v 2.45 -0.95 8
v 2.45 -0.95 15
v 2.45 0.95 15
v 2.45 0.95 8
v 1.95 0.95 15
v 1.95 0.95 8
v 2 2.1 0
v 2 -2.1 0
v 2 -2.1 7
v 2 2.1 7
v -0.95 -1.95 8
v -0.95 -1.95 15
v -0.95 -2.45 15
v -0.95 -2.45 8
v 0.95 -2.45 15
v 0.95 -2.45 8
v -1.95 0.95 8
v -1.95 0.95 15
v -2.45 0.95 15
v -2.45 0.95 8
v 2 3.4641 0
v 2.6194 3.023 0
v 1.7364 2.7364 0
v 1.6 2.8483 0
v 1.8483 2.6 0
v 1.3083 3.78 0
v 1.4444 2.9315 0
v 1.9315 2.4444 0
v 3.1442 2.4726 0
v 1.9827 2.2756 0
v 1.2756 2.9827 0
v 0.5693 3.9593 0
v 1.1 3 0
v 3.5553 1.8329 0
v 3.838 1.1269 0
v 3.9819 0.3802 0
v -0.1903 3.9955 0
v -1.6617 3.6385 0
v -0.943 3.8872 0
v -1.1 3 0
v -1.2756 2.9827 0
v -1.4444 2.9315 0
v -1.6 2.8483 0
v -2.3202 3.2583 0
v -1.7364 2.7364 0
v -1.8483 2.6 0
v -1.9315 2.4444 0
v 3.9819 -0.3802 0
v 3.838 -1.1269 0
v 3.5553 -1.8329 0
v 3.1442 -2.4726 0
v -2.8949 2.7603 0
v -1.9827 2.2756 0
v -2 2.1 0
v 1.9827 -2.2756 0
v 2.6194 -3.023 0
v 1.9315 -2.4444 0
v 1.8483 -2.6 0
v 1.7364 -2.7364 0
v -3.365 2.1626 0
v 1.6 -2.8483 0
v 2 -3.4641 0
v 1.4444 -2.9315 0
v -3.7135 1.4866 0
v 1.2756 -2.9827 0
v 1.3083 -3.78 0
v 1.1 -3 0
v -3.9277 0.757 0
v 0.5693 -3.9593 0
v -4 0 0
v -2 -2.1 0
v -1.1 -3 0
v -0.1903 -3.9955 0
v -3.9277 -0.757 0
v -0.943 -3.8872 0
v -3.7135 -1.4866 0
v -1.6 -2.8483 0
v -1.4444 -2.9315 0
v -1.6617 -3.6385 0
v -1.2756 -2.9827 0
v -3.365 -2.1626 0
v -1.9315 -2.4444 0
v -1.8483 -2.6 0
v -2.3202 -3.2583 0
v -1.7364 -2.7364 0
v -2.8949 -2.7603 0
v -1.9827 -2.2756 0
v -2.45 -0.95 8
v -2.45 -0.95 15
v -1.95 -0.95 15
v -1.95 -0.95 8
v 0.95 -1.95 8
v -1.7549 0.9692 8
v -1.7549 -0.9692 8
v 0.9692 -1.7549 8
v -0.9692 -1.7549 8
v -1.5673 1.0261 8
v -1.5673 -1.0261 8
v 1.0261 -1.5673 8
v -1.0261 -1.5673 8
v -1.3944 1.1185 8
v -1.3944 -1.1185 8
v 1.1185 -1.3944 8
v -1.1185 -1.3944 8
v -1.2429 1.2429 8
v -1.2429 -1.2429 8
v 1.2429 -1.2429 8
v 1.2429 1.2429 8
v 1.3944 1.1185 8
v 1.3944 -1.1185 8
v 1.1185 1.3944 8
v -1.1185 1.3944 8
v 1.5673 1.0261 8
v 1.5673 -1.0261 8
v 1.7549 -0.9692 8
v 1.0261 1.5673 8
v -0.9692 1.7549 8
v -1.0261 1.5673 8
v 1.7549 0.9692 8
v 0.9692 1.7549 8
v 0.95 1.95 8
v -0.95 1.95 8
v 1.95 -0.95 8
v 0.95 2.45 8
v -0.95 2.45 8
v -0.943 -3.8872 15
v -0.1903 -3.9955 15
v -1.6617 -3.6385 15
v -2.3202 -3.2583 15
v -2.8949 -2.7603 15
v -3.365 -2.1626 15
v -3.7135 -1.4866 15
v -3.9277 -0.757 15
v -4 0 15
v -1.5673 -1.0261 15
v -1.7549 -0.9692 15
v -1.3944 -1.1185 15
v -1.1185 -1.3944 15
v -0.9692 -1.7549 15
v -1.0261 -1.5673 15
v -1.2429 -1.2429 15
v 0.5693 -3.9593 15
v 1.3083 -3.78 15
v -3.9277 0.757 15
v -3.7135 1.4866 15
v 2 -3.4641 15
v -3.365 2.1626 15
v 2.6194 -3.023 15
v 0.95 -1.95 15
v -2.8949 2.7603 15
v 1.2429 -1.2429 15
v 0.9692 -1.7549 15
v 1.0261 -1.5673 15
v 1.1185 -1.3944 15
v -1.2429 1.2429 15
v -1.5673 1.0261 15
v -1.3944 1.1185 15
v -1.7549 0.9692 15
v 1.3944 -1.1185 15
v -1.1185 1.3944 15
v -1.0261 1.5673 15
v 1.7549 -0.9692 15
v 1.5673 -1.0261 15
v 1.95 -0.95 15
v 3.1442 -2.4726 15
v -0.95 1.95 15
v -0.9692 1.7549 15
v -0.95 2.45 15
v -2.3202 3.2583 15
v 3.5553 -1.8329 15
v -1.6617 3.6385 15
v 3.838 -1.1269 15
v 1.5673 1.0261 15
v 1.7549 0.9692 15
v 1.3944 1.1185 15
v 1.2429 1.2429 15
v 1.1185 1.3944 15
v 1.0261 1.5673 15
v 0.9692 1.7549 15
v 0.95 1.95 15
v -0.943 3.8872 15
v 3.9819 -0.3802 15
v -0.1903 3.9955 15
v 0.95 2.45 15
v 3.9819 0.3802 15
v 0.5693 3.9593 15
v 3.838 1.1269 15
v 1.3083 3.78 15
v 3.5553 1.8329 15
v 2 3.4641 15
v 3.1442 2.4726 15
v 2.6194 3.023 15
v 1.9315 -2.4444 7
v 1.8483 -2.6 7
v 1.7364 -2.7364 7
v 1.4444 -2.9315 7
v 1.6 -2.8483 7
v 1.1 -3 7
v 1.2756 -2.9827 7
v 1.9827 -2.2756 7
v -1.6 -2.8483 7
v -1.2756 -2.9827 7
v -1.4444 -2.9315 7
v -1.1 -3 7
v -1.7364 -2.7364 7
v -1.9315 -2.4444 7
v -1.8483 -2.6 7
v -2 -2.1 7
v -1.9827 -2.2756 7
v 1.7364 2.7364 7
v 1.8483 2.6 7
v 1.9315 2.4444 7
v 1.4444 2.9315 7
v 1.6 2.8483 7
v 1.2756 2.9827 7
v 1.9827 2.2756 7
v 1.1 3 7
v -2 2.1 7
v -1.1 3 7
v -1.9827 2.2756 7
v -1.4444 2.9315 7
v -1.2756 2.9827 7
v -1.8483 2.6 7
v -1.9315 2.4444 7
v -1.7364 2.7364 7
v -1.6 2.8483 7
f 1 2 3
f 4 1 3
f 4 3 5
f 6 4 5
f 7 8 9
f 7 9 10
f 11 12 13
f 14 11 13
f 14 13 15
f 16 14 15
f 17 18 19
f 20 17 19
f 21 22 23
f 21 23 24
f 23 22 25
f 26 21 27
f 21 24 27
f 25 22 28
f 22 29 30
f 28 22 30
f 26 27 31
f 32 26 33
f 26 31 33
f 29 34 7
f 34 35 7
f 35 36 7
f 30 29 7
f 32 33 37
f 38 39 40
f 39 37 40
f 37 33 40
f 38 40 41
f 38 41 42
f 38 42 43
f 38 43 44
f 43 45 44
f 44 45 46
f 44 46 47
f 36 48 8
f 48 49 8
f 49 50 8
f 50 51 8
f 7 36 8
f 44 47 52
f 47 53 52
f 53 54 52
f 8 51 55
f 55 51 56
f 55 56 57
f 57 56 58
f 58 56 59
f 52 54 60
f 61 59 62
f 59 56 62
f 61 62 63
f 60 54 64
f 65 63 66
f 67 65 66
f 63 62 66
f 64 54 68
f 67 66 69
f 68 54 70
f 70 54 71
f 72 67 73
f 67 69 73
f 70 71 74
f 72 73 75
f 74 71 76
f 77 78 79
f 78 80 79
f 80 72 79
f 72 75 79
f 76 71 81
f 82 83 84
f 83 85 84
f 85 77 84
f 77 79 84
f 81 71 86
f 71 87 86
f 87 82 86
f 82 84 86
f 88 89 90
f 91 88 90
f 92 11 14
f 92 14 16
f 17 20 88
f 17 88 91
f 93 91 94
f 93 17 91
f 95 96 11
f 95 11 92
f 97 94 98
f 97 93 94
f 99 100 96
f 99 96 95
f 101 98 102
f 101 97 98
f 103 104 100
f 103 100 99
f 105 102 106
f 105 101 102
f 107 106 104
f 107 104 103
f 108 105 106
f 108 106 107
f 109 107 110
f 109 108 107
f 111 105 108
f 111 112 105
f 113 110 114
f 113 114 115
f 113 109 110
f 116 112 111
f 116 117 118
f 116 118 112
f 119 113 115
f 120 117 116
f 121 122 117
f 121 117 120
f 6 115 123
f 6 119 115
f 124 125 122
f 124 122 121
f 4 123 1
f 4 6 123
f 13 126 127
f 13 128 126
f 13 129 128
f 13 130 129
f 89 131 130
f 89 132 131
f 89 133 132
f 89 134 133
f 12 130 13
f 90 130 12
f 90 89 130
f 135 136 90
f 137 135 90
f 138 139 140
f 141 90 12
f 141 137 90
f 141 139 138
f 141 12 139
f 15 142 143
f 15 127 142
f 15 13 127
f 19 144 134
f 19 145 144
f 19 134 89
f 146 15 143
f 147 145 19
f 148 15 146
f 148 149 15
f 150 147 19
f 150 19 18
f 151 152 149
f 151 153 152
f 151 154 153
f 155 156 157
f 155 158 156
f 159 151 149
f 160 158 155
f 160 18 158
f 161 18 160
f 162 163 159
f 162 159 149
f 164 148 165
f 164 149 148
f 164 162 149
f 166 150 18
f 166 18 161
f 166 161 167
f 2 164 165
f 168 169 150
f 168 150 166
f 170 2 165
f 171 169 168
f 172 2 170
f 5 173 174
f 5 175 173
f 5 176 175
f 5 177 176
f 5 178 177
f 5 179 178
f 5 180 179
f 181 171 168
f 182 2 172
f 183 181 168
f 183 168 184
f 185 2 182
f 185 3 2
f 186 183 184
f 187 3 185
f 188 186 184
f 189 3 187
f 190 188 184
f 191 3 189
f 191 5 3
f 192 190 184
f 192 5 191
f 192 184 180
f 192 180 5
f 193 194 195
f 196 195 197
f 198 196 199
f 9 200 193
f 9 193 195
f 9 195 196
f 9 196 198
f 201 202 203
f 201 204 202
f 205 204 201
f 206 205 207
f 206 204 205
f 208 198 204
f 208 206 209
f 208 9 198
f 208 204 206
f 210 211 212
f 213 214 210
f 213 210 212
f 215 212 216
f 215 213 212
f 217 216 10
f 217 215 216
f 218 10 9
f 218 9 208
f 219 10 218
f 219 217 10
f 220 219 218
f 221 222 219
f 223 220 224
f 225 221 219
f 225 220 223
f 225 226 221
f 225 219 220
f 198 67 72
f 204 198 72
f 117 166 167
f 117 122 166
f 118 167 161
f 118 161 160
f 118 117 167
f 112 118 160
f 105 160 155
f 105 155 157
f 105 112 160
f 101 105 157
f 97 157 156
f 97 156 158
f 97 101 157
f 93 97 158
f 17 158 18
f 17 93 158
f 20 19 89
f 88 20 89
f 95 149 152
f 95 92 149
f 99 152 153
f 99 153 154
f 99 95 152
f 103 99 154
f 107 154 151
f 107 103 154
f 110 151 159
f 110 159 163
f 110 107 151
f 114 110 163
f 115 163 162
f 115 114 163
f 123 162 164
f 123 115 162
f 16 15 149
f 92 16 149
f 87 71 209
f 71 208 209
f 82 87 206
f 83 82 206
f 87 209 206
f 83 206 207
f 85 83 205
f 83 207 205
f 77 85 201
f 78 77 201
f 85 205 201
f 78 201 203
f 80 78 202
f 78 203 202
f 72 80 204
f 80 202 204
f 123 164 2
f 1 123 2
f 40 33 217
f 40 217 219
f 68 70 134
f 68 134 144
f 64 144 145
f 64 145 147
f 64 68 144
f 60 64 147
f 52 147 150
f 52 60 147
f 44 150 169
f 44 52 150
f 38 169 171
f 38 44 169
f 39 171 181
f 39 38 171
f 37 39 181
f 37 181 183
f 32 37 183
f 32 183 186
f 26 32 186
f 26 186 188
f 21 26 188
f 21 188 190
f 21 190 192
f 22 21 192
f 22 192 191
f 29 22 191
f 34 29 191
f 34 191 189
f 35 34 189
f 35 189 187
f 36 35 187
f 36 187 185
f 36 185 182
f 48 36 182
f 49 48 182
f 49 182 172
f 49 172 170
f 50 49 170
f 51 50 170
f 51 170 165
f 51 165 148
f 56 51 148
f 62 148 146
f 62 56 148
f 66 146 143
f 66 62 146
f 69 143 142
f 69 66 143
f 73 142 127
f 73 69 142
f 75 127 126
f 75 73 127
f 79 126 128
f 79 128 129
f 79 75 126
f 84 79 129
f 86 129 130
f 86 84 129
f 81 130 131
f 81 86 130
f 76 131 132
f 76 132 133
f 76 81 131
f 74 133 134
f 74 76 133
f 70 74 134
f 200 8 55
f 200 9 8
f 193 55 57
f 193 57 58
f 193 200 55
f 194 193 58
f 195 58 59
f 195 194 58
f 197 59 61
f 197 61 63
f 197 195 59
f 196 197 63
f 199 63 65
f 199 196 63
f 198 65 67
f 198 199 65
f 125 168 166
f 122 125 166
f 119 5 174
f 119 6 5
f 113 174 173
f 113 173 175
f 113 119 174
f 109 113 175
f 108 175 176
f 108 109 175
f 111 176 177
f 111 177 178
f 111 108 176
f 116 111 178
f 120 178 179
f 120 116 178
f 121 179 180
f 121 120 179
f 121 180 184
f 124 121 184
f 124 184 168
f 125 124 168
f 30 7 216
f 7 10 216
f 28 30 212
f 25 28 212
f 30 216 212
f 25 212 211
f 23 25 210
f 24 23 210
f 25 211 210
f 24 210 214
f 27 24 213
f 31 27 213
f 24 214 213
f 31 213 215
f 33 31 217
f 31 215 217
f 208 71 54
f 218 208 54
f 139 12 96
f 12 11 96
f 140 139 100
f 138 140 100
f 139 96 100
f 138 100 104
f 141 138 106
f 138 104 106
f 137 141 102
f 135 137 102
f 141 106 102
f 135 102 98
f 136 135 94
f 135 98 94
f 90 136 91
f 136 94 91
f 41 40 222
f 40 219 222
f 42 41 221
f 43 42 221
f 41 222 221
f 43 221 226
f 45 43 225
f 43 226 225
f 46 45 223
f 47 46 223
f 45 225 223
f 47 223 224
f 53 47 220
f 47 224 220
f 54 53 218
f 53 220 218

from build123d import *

# Parameters (mm, degrees)
SKETCH1_R           = 4.5
BOSS_EXTRUDE1_DEPTH = 15
SKETCH2_W           = 4
SKETCH2_H           = 6
CUT_EXTRUDE1_DEPTH  = 7
CUT_EXTRUDE2_DEPTH  = 7
FILLET3_R           = 1
FILLET4_R           = 0.9
SKETCH4_R           = 4.5
SKETCH4_R_2         = 4
CUT_EXTRUDE3_DEPTH  = 15
SKETCH6_W           = 9.329019204
SKETCH6_H           = 8.683838676
SKETCH6_W_2         = 5
SKETCH6_H_2         = 7
CUT_EXTRUDE4_DEPTH  = 7
BOSS_EXTRUDE2_START = -15
SKETCH7_R           = 4
SKETCH7_R_2         = 3.5
BOSS_EXTRUDE2_DEPTH = 15
SKETCH8_W           = 7.8
SKETCH8_H           = 4.898979486
BOSS_EXTRUDE3_DEPTH = 1
SKETCH9_W           = 7.7
SKETCH9_H           = 5
BOSS_EXTRUDE4_DEPTH = 1
SKETCH10_R          = 4.498846738
SKETCH10_R_2        = 4
CUT_EXTRUDE7_DEPTH  = 21


with BuildPart() as part:
    # Sketch1 → Boss-Extrude1 (new body)
    with BuildSketch(Plane.XY):
        Circle(SKETCH1_R)
    extrude(amount=BOSS_EXTRUDE1_DEPTH)

    # Sketch2 → Cut-Extrude1 (cut)
    with BuildSketch(Plane(origin=(0, 0, 0), x_dir=(-1, 0, 0), z_dir=(0, 0, -1))):
        Rectangle(SKETCH2_W, SKETCH2_H)
    extrude(amount=-CUT_EXTRUDE1_DEPTH, mode=Mode.SUBTRACT)

    # Sketch3 → Cut-Extrude2 (cut)
    with BuildSketch(Plane.XY.offset(15)):
        Polygon((-0.95, -0.95), (-0.95, -2.45), (0.95, -2.45), (0.95, -0.95), (2.45, -0.95), (2.45, 0.95), (0.95, 0.95), (0.95, 2.45), (-0.95, 2.45), (-0.95, 0.95), (-2.45, 0.95), (-2.45, -0.95), align=None)
    extrude(amount=-CUT_EXTRUDE2_DEPTH, mode=Mode.SUBTRACT)

    # Fillet3
    fillet3_edges = [part.edges().sort_by_distance(p)[0] for p in [
        (0.95, -0.95, 11.5),
        (-0.95, -0.95, 11.5),
        (-0.95, 0.95, 11.5),
        (0.95, 0.95, 11.5),
    ]]
    fillet(fillet3_edges, radius=FILLET3_R)

    # Fillet4
    fillet4_edges = [part.edges().sort_by_distance(p)[0] for p in [
        (-2, 3, 3.5),
        (-2, -3, 3.5),
        (2, -3, 3.5),
        (2, 3, 3.5),
    ]]
    fillet(fillet4_edges, radius=FILLET4_R)

    # Sketch4 → Cut-Extrude3 (cut)
    with BuildSketch(Plane(origin=(0, 0, 0), x_dir=(-1, 0, 0), z_dir=(0, 0, -1))):
        Circle(SKETCH4_R)
        Circle(SKETCH4_R_2, mode=Mode.SUBTRACT)
    extrude(amount=-CUT_EXTRUDE3_DEPTH, mode=Mode.SUBTRACT)

    # Sketch6 → Cut-Extrude4 (cut)
    with BuildSketch(Plane(origin=(0, 0, 0), x_dir=(-1, 0, 0), z_dir=(0, 0, -1))):
        Rectangle(SKETCH6_W, SKETCH6_H)
        Rectangle(SKETCH6_W_2, SKETCH6_H_2, mode=Mode.SUBTRACT)
    extrude(amount=-CUT_EXTRUDE4_DEPTH, mode=Mode.SUBTRACT)

    # Sketch7 → Boss-Extrude2 (add)
    with BuildSketch(Plane.XY.offset(15).offset(BOSS_EXTRUDE2_START)):
        with Locations(Location((0, 0, 0), (0, 0, 180))):
            Circle(SKETCH7_R)
        Circle(SKETCH7_R_2, mode=Mode.SUBTRACT)
    extrude(amount=BOSS_EXTRUDE2_DEPTH)

    # Sketch8 → Boss-Extrude3 (add)
    with BuildSketch(Plane(origin=(2.5, 0, 0), x_dir=(0, 0, -1), z_dir=(1, 0, 0))):
        with Locations((-3.9, 0)):
            Rectangle(SKETCH8_W, SKETCH8_H)
    extrude(amount=BOSS_EXTRUDE3_DEPTH)

    # Sketch9 → Boss-Extrude4 (add)
    with BuildSketch(Plane.ZY.offset(2.5)):
        with Locations((3.85, -0.050510257)):
            Rectangle(SKETCH9_W, SKETCH9_H)
    extrude(amount=BOSS_EXTRUDE4_DEPTH)

    # Sketch10 → Cut-Extrude7 (cut)
    with BuildSketch(Plane(origin=(0, 0, 0), x_dir=(-1, 0, 0), z_dir=(0, 0, -1))):
        Circle(SKETCH10_R)
        Circle(SKETCH10_R_2, mode=Mode.SUBTRACT)
    extrude(amount=-CUT_EXTRUDE7_DEPTH, mode=Mode.SUBTRACT)


solid = part.part
